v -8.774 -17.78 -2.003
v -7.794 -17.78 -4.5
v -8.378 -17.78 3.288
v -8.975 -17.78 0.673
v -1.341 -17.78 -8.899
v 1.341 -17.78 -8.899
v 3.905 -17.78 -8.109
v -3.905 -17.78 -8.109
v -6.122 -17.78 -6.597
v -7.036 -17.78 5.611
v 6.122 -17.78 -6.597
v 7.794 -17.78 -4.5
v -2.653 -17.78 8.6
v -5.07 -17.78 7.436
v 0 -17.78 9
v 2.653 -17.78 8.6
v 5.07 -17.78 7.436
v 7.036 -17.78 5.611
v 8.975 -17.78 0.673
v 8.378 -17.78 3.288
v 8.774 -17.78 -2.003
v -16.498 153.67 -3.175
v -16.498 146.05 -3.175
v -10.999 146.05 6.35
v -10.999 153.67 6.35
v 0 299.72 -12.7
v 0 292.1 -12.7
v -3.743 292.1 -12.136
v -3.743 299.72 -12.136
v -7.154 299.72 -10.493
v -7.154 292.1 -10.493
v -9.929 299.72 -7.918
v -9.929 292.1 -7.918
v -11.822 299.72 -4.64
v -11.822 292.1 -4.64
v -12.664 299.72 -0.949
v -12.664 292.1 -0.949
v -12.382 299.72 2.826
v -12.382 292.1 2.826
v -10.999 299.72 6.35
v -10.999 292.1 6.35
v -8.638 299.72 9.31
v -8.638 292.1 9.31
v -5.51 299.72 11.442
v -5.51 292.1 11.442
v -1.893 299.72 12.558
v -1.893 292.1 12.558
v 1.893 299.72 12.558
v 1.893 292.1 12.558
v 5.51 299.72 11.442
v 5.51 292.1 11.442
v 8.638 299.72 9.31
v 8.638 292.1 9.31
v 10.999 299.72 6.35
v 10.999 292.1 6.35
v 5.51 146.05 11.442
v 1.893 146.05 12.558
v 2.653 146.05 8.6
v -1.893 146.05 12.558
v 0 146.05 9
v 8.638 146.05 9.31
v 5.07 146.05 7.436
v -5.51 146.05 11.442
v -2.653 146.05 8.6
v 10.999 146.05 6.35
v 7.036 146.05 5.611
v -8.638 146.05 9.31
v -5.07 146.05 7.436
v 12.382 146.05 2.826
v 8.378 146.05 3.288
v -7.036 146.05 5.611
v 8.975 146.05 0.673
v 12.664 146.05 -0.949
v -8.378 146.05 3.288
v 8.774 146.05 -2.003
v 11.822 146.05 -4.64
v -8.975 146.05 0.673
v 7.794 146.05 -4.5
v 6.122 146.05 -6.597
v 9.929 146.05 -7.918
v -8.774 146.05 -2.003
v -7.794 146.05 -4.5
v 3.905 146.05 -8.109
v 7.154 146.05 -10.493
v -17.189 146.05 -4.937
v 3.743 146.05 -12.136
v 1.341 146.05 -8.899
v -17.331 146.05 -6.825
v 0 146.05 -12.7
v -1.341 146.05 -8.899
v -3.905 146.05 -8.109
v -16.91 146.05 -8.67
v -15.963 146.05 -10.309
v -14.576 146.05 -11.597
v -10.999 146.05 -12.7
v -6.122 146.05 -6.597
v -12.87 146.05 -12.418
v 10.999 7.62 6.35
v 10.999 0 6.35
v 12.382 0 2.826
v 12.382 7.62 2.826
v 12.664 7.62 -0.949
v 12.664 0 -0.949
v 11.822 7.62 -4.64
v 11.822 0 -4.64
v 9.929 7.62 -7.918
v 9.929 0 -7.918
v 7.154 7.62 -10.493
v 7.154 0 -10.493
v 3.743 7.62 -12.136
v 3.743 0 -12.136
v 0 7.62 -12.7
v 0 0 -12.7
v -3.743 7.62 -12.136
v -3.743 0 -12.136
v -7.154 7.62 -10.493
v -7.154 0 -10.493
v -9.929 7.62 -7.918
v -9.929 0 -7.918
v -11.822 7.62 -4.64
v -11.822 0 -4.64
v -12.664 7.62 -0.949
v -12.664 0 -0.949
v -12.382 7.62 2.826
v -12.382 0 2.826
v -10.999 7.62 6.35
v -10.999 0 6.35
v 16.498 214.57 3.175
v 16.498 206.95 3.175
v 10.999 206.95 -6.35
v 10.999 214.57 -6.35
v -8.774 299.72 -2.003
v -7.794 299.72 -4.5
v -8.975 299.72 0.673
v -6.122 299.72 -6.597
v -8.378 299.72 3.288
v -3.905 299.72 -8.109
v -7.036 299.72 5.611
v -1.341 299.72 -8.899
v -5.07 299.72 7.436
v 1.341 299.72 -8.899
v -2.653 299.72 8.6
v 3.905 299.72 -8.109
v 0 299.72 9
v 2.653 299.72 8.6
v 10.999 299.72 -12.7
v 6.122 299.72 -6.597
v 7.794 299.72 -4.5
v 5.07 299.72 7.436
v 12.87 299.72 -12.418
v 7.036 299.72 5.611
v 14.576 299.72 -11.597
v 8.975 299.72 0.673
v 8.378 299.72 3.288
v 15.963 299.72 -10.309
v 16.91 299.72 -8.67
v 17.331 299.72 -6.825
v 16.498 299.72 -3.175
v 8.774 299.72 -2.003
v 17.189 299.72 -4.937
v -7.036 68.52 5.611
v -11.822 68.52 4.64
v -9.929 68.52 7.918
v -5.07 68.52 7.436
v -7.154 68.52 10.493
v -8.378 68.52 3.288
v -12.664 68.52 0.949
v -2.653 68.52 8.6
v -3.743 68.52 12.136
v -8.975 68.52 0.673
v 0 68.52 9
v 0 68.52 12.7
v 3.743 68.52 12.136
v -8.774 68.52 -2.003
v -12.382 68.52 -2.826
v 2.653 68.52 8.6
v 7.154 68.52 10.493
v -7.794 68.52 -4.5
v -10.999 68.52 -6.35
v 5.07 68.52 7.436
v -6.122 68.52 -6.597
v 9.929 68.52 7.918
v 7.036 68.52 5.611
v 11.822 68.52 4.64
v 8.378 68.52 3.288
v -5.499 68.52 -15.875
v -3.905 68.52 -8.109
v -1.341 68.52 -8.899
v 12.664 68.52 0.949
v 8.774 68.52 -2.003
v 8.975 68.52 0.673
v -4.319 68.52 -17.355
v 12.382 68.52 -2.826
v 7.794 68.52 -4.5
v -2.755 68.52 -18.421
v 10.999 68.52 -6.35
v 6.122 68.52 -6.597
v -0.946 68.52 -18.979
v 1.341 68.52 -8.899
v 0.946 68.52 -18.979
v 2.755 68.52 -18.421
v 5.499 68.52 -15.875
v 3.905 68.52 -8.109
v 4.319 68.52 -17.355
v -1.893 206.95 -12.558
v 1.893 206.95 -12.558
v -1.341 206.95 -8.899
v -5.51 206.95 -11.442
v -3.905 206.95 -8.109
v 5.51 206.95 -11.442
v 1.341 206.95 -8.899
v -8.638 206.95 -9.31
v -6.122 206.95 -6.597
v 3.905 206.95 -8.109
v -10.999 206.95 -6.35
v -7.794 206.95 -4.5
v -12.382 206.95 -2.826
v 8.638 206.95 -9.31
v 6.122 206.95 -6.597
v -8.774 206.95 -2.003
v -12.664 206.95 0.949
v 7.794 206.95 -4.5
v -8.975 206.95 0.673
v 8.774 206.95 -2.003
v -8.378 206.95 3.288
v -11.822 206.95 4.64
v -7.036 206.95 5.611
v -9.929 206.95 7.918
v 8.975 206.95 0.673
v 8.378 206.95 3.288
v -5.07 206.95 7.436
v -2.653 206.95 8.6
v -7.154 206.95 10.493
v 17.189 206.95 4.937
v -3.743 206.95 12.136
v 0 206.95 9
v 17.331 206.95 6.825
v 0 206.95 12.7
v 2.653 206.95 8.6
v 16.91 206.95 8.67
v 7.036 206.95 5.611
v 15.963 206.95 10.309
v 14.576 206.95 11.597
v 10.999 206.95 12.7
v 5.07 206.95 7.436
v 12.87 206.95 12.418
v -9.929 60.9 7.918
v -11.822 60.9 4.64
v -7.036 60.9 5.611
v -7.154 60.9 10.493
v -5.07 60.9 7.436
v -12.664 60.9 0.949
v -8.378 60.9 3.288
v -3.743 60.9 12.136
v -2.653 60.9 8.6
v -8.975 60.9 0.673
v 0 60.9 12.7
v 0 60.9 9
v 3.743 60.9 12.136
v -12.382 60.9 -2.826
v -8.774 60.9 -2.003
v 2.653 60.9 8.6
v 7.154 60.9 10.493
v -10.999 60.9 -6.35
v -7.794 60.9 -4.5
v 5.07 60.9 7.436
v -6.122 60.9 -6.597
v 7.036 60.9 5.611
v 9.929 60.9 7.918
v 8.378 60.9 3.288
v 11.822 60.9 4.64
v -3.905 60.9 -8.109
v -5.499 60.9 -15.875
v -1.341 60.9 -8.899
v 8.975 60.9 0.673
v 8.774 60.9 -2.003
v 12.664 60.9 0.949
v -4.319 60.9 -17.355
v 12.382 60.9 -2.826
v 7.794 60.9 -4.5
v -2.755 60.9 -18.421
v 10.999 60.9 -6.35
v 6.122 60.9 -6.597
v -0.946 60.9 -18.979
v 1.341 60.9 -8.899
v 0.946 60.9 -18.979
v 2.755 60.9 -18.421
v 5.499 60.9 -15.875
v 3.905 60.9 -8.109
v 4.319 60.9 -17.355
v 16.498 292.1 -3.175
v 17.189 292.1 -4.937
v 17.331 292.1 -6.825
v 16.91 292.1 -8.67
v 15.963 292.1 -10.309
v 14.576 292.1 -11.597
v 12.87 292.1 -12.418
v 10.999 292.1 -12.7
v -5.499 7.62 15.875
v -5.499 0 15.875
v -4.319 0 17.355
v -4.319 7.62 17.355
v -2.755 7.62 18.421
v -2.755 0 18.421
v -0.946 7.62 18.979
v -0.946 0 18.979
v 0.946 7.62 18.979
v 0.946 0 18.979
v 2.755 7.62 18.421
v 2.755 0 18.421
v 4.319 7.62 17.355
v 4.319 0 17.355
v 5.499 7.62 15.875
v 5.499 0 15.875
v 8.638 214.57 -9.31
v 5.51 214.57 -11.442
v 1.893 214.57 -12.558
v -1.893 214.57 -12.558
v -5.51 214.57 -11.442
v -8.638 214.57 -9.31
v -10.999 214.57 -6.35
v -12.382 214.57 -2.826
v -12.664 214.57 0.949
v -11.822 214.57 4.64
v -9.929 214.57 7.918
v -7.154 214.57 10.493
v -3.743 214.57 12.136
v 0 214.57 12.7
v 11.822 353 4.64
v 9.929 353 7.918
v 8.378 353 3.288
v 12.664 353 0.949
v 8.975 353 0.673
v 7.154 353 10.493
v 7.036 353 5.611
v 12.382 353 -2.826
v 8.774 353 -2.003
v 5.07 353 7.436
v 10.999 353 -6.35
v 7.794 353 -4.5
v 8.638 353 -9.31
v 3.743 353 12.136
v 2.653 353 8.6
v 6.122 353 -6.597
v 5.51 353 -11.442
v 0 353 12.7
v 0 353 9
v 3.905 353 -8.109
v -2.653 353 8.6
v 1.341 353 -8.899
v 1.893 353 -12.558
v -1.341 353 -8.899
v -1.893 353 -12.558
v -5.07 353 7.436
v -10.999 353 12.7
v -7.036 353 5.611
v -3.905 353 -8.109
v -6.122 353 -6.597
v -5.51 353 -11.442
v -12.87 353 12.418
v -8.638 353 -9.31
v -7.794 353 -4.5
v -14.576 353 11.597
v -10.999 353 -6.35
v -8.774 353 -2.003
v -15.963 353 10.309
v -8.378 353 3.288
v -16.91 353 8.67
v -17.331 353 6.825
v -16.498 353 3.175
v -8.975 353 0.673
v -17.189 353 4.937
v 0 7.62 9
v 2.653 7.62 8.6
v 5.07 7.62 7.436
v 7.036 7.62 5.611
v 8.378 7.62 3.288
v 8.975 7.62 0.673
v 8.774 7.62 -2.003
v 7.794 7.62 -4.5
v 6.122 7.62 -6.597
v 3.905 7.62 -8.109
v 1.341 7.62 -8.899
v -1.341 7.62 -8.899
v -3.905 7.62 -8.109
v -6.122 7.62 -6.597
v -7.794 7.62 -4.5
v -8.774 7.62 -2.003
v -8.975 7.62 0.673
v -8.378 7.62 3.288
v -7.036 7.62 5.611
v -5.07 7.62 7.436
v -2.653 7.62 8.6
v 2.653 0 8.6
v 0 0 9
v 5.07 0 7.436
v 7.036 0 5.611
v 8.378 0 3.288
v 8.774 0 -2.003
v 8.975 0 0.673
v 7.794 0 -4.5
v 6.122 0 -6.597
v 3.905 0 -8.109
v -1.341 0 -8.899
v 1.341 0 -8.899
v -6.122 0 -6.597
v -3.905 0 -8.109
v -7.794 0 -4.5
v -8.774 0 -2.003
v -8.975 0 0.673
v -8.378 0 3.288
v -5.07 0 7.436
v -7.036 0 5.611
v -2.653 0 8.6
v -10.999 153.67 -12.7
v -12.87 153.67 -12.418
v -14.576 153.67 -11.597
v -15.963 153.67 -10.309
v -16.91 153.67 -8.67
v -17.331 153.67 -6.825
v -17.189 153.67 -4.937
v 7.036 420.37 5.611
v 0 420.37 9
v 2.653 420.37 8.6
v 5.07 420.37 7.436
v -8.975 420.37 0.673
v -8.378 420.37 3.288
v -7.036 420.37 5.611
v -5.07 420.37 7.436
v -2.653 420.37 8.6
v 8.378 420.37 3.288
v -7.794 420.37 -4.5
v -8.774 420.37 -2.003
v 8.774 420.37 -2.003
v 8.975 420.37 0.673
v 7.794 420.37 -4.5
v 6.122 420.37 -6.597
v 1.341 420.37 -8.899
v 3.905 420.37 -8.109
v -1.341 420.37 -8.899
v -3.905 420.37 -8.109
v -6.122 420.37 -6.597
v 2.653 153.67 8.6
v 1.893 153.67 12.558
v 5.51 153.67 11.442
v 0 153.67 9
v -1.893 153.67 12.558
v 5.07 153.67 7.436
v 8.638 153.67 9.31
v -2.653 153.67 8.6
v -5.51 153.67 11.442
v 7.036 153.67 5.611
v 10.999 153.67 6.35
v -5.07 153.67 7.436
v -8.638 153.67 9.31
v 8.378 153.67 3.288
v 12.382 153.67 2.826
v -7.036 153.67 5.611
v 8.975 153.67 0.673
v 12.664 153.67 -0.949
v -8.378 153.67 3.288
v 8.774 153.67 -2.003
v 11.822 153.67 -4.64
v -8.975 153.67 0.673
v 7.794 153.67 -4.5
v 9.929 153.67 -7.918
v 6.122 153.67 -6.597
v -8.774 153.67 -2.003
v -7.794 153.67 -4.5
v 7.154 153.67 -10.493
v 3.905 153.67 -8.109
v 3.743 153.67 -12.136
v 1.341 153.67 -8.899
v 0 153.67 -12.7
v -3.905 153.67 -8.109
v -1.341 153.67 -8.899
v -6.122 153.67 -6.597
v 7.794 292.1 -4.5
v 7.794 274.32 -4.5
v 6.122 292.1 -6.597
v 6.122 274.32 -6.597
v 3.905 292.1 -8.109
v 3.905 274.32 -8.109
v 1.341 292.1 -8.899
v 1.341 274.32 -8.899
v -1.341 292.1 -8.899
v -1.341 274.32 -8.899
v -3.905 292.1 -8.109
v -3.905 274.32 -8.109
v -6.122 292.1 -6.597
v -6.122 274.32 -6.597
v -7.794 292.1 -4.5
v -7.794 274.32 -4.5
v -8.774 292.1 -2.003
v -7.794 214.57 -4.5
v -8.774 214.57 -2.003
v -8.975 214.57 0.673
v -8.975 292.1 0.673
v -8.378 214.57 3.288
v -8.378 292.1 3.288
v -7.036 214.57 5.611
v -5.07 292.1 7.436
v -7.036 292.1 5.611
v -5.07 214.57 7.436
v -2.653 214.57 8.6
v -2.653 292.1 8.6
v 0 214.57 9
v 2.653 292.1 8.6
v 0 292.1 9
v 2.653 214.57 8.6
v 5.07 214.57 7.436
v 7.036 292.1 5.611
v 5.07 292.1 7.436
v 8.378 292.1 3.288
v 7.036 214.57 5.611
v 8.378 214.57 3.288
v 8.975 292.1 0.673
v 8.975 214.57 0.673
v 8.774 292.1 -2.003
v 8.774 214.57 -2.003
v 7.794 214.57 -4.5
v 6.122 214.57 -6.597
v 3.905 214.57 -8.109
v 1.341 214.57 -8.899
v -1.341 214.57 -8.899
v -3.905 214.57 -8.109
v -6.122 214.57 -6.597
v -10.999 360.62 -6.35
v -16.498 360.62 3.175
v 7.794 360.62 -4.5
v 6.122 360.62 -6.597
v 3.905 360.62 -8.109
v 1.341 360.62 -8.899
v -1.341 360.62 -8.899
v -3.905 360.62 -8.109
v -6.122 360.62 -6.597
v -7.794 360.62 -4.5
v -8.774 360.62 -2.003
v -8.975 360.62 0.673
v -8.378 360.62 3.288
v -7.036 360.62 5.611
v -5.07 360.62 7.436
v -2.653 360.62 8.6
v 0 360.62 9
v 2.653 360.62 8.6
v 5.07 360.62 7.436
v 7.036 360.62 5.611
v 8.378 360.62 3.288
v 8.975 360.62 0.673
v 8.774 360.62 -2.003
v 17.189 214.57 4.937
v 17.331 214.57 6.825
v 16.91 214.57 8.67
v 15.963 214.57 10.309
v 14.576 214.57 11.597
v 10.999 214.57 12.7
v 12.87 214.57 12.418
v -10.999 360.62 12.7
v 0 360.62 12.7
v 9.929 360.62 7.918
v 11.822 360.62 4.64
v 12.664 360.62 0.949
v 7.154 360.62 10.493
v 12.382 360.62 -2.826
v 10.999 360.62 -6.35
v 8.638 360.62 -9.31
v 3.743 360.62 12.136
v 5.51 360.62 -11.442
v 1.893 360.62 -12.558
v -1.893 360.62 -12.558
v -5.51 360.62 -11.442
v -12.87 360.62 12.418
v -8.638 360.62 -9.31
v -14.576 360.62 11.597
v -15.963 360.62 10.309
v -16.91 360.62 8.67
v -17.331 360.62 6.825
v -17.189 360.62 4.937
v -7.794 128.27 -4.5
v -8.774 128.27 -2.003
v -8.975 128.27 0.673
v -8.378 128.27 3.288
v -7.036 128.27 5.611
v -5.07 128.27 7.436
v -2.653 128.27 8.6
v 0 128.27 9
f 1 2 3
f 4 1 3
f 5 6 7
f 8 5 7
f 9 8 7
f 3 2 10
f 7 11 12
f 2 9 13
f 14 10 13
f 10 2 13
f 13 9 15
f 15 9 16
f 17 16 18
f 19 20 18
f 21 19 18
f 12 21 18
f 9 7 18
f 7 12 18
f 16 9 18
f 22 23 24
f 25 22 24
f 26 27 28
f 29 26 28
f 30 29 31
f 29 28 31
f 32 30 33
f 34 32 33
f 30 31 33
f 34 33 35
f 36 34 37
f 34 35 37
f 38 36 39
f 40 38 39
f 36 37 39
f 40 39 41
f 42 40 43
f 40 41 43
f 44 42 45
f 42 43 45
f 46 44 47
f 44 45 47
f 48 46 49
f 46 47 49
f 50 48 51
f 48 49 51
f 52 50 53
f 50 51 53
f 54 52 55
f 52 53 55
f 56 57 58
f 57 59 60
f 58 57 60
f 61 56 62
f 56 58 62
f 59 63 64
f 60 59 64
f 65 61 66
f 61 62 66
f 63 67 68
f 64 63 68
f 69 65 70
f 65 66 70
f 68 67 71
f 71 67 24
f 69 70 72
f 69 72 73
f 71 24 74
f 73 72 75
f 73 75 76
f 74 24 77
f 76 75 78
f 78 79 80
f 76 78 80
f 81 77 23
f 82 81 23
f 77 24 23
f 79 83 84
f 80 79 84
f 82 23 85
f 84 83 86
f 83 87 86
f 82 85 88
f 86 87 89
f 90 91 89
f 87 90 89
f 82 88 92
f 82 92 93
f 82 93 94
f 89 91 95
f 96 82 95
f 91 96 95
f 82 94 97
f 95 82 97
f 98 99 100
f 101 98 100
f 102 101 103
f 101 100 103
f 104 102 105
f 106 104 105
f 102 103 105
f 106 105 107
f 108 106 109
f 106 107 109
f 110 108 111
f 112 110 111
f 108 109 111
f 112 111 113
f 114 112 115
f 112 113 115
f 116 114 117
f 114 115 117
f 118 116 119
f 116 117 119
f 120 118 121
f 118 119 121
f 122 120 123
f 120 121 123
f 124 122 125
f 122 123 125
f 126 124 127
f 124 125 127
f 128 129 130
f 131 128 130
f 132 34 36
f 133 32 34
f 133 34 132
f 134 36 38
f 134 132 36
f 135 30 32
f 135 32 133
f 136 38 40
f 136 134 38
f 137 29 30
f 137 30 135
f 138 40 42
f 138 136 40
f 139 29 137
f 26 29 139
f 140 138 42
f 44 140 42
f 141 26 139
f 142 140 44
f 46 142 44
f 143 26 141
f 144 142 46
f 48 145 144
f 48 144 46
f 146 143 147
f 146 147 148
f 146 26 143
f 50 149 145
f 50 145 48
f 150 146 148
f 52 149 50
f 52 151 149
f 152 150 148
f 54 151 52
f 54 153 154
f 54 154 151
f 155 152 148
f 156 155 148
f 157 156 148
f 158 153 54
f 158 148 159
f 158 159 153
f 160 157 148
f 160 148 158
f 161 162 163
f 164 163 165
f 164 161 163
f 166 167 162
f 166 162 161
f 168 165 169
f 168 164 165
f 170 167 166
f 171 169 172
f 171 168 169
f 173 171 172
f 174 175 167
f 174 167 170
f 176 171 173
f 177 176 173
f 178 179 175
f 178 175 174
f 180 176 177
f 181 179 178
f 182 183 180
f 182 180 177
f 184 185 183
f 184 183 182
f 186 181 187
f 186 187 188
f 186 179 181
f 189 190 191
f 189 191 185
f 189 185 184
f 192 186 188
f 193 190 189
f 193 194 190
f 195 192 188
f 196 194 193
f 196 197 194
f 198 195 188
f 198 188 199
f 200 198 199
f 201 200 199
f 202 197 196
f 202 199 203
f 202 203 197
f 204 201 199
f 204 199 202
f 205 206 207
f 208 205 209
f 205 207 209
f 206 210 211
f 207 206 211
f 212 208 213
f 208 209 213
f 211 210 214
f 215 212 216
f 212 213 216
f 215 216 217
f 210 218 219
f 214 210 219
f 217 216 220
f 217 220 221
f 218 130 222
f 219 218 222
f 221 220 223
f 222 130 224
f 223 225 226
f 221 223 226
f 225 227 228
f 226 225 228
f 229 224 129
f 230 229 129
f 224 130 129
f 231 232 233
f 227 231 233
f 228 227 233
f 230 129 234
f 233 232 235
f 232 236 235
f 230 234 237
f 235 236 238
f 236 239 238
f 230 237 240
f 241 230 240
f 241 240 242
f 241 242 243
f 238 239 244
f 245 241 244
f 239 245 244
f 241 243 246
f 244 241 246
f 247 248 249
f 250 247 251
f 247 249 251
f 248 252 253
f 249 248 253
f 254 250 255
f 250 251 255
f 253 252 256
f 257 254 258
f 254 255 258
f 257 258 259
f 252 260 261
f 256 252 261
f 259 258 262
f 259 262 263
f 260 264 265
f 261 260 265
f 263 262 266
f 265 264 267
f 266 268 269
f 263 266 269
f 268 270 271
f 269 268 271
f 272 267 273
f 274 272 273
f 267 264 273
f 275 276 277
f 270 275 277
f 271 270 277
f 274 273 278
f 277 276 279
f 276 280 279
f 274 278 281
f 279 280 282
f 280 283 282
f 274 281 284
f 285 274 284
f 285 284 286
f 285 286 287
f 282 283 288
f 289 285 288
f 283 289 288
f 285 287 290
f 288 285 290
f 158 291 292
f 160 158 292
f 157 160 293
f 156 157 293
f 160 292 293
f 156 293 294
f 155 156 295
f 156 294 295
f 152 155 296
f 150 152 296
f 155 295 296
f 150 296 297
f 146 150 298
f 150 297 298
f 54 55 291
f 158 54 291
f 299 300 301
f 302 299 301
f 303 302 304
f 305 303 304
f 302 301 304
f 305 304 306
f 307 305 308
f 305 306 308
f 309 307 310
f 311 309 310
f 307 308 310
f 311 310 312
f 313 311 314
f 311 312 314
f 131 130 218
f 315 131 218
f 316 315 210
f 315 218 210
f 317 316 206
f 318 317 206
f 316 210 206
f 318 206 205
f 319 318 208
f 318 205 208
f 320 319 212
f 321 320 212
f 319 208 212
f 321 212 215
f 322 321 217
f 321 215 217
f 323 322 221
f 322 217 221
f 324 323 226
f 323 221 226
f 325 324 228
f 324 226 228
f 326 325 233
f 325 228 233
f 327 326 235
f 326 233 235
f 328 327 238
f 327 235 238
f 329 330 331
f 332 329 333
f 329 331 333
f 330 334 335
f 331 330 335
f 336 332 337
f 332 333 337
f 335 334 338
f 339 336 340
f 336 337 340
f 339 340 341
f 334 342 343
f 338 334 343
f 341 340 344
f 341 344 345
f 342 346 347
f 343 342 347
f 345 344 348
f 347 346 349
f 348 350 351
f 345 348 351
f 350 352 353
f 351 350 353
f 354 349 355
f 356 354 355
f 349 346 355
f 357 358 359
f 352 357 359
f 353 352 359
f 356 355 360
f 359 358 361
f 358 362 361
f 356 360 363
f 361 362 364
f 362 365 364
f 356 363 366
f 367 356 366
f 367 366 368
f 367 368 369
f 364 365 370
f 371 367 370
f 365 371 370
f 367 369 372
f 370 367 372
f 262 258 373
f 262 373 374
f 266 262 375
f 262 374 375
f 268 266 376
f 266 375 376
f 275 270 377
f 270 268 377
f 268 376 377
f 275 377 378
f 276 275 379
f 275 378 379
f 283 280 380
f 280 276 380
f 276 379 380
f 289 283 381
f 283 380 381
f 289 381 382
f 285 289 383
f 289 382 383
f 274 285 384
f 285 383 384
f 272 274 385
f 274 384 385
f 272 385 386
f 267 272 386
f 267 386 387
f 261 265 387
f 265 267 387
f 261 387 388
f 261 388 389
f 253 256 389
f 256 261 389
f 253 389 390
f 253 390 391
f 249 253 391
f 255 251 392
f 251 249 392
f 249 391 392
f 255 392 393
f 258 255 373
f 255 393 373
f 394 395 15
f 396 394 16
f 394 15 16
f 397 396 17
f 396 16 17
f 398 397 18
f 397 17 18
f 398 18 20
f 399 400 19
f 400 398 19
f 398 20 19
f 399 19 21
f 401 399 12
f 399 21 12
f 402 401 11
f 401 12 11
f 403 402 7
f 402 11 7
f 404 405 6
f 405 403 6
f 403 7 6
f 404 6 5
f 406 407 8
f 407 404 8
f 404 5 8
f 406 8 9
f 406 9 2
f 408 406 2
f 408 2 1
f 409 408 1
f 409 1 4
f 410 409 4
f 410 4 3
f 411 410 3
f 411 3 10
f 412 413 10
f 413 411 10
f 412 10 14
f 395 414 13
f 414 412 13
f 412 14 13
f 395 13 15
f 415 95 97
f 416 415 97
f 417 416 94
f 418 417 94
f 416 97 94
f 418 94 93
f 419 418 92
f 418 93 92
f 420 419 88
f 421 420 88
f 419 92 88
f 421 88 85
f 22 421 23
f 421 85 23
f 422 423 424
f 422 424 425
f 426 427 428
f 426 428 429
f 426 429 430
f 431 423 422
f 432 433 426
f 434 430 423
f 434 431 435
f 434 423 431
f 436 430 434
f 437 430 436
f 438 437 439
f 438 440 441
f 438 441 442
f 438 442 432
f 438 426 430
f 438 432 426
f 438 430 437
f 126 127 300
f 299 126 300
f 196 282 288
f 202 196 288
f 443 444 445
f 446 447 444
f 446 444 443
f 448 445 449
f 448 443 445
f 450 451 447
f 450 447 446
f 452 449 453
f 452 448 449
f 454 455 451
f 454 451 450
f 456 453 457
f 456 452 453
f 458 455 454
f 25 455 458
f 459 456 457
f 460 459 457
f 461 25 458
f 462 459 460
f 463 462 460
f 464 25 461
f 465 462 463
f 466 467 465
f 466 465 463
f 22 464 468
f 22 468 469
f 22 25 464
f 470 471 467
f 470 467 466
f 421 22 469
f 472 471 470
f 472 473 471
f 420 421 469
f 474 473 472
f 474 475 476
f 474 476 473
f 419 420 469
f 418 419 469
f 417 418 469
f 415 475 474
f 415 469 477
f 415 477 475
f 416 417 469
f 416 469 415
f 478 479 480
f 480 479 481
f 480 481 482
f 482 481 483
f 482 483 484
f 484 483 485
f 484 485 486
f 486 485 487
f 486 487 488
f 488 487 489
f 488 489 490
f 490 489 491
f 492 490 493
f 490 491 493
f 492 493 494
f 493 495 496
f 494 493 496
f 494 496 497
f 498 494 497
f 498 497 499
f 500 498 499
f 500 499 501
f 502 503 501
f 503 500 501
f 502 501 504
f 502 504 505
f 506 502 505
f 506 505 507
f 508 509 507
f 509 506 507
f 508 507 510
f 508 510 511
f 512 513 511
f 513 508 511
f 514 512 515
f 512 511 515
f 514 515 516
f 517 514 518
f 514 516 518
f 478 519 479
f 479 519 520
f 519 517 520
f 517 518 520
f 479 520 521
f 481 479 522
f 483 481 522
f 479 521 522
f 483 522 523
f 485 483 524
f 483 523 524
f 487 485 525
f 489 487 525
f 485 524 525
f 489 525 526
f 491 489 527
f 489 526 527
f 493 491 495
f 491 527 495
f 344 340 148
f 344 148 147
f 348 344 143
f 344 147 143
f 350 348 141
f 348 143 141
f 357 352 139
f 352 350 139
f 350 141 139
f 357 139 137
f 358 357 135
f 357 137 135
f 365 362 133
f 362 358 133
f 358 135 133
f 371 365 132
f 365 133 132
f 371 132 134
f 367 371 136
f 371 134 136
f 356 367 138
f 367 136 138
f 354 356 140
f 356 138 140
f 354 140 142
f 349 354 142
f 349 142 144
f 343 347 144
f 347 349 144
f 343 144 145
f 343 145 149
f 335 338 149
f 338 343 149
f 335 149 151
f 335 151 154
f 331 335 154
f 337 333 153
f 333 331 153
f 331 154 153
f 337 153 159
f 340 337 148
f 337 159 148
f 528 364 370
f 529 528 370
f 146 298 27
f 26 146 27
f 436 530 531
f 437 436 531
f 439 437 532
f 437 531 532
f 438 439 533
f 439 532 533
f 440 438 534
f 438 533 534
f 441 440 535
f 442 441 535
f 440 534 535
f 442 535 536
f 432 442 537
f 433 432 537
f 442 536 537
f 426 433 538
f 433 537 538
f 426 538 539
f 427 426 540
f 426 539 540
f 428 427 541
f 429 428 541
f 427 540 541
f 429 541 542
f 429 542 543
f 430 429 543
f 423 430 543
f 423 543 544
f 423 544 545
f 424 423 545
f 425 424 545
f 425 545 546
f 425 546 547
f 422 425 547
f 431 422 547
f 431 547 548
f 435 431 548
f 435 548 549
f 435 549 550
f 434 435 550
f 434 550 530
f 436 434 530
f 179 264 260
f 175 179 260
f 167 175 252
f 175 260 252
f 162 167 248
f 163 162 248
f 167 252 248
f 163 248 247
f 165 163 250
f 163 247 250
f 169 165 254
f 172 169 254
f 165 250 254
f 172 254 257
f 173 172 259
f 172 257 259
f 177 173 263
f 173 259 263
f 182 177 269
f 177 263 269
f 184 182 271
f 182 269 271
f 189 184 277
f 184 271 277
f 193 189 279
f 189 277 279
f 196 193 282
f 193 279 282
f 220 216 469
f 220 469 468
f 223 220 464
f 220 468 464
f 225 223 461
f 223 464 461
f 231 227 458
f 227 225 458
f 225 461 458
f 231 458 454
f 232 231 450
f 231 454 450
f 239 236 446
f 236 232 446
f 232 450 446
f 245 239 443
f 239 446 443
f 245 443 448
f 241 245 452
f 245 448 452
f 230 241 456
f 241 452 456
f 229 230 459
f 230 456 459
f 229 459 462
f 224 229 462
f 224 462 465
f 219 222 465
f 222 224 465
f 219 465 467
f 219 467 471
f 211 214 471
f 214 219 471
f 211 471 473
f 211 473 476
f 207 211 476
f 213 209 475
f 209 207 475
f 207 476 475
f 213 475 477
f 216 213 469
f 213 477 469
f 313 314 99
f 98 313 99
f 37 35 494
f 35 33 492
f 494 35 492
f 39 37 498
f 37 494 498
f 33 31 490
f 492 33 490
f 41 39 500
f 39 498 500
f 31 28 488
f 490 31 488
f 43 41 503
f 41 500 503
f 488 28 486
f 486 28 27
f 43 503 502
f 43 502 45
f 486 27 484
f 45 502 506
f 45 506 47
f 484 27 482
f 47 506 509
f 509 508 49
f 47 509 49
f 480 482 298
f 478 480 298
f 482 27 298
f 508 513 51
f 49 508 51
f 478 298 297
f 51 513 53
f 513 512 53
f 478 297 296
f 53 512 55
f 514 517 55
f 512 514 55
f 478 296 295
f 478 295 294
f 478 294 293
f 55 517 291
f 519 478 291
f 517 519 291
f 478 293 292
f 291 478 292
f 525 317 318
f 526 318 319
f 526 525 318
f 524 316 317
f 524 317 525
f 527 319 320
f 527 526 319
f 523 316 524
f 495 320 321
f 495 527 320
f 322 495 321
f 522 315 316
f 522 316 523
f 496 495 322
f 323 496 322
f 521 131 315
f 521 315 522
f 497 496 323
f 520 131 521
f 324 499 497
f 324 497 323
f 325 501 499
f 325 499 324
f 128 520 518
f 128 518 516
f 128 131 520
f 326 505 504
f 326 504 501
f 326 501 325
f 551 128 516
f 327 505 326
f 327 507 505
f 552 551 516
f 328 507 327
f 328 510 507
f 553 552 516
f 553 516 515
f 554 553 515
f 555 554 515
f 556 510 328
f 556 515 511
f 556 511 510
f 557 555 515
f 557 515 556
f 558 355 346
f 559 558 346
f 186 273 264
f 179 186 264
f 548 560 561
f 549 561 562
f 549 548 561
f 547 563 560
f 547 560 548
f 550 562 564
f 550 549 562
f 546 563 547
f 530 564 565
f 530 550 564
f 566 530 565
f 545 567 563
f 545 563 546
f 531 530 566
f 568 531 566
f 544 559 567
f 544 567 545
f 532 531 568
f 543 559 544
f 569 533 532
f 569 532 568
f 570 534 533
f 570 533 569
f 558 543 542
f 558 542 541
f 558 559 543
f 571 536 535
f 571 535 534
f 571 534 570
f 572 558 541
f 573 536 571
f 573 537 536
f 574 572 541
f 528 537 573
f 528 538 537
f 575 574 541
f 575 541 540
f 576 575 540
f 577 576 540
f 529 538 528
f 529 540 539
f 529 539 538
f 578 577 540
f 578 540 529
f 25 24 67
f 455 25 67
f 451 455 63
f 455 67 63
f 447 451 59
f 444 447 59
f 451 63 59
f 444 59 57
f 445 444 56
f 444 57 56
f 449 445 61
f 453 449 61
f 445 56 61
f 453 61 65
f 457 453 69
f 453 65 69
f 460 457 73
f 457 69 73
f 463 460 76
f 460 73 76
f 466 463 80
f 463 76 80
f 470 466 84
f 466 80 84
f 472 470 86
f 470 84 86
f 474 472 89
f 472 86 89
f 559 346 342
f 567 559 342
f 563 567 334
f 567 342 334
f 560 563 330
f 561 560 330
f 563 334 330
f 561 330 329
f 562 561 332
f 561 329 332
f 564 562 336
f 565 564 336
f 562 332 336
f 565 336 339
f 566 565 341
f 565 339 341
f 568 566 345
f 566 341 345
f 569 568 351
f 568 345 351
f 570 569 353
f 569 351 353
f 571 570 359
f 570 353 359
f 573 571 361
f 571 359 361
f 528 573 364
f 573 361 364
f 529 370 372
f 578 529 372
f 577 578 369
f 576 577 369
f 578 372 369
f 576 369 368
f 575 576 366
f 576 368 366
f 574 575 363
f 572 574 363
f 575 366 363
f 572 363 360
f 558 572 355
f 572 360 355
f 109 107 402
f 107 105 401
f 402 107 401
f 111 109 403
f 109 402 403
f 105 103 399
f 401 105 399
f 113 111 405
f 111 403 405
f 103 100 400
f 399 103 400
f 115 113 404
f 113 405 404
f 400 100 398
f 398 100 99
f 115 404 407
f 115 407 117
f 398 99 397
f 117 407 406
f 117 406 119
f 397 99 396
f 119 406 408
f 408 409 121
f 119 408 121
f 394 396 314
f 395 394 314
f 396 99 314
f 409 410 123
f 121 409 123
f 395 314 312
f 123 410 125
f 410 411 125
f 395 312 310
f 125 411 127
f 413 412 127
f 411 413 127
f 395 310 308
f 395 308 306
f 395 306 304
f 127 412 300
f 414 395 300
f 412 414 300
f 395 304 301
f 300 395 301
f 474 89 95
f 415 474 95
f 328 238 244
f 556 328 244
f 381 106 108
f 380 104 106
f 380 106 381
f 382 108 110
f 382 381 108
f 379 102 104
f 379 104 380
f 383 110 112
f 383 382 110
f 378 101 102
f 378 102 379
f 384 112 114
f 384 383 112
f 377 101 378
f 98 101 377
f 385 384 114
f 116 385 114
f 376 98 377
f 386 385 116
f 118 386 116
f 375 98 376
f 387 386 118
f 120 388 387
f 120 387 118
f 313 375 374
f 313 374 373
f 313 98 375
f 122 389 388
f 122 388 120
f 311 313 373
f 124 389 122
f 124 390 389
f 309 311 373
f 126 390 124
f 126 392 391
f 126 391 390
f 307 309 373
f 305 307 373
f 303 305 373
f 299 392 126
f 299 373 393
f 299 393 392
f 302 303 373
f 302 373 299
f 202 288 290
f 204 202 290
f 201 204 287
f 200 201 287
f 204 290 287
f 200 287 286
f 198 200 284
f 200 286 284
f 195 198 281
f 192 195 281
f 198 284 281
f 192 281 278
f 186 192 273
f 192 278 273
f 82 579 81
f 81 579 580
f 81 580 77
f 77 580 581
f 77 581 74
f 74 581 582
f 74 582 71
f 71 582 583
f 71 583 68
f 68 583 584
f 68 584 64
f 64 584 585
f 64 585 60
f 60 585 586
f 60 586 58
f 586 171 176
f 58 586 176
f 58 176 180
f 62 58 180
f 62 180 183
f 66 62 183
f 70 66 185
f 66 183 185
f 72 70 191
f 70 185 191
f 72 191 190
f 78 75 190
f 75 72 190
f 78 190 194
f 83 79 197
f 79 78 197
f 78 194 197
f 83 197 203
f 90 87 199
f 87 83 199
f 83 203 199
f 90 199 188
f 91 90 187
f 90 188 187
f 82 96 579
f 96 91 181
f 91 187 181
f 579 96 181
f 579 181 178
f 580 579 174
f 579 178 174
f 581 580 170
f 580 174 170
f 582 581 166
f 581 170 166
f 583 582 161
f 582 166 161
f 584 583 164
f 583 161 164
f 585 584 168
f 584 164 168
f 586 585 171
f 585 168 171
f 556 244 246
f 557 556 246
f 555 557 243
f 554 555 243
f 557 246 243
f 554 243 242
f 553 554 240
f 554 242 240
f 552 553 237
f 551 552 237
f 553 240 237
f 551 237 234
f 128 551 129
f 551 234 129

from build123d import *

# Parameters (mm, degrees)
BOSS_EXTRUDE5_DEPTH   = 7.62
BODY_MOVE_COPY3_ANGLE = 180
BOSS_EXTRUDE7_START   = -25.4
SKETCH7_R             = 9
BOSS_EXTRUDE7_DEPTH   = 146.05
LPATTERN1_COUNT       = 3
LPATTERN1_PITCH       = 146.05
BODY_MOVE_COPY4_ANGLE = 120
BODY_MOVE_COPY5_ANGLE = 120


with BuildPart() as part:
    # Sketch6 → Boss-Extrude5 (new body)
    with BuildSketch(Plane(origin=(0, 0, 0), x_dir=(-1, 0, 0), z_dir=(0, 1, 0))):
        with BuildLine():
            Line((-5.499261314, 15.875), (-10.998522628, 6.35))
            ThreePointArc((-10.998522628, 6.35), (0, -12.7), (10.998522628, 6.35))
            Line((10.998522628, 6.35), (5.499261314, 15.875))
            ThreePointArc((5.499261314, 15.875), (0, 19.05), (-5.499261314, 15.875))
        make_face()
    extrude(amount=BOSS_EXTRUDE5_DEPTH)


with BuildPart() as body_2:
    # Body-Move/Copy2: copy of part
    add(part.part.moved(Location((0, 60.9, 0))))


with BuildPart() as body_2_1:
    # Body-Move/Copy3: moved
    add(body_2.part.rotate(Axis((0, 0, 0), (0, 1, 0)), BODY_MOVE_COPY3_ANGLE))


with BuildPart() as part_1:
    add(part.part)

    add(body_2_1.part)  # Boss-Extrude7 merges body 2
    # Sketch7 → Boss-Extrude7 (add)
    with BuildSketch(Plane(origin=(0, 7.62, 0), x_dir=(-1, 0, 0), z_dir=(0, 1, 0)).offset(BOSS_EXTRUDE7_START)):
        Circle(SKETCH7_R)
    extrude(amount=BOSS_EXTRUDE7_DEPTH)


with BuildPart() as lpattern1_1:
    # LPattern1: pattern copy
    add(part_1.part.moved(Location(Vector(0, 1, 0) * (1 * LPATTERN1_PITCH))))


with BuildPart() as lpattern1_2:
    # LPattern1: pattern copy
    add(part_1.part.moved(Location(Vector(0, 1, 0) * (2 * LPATTERN1_PITCH))))


with BuildPart() as lpattern1_1_1:
    # Body-Move/Copy4: moved
    add(lpattern1_1.part.rotate(Axis((0, 0, 0), (0, -1, 0)), BODY_MOVE_COPY4_ANGLE))


with BuildPart() as lpattern1_2_1:
    # Body-Move/Copy5: moved
    add(lpattern1_2.part.rotate(Axis((0, 0, 0), (0, 1, 0)), BODY_MOVE_COPY5_ANGLE))

    # Combine1: union part, LPattern1_1
    add(part_1.part)
    add(lpattern1_1_1.part)


solid = lpattern1_2_1.part
